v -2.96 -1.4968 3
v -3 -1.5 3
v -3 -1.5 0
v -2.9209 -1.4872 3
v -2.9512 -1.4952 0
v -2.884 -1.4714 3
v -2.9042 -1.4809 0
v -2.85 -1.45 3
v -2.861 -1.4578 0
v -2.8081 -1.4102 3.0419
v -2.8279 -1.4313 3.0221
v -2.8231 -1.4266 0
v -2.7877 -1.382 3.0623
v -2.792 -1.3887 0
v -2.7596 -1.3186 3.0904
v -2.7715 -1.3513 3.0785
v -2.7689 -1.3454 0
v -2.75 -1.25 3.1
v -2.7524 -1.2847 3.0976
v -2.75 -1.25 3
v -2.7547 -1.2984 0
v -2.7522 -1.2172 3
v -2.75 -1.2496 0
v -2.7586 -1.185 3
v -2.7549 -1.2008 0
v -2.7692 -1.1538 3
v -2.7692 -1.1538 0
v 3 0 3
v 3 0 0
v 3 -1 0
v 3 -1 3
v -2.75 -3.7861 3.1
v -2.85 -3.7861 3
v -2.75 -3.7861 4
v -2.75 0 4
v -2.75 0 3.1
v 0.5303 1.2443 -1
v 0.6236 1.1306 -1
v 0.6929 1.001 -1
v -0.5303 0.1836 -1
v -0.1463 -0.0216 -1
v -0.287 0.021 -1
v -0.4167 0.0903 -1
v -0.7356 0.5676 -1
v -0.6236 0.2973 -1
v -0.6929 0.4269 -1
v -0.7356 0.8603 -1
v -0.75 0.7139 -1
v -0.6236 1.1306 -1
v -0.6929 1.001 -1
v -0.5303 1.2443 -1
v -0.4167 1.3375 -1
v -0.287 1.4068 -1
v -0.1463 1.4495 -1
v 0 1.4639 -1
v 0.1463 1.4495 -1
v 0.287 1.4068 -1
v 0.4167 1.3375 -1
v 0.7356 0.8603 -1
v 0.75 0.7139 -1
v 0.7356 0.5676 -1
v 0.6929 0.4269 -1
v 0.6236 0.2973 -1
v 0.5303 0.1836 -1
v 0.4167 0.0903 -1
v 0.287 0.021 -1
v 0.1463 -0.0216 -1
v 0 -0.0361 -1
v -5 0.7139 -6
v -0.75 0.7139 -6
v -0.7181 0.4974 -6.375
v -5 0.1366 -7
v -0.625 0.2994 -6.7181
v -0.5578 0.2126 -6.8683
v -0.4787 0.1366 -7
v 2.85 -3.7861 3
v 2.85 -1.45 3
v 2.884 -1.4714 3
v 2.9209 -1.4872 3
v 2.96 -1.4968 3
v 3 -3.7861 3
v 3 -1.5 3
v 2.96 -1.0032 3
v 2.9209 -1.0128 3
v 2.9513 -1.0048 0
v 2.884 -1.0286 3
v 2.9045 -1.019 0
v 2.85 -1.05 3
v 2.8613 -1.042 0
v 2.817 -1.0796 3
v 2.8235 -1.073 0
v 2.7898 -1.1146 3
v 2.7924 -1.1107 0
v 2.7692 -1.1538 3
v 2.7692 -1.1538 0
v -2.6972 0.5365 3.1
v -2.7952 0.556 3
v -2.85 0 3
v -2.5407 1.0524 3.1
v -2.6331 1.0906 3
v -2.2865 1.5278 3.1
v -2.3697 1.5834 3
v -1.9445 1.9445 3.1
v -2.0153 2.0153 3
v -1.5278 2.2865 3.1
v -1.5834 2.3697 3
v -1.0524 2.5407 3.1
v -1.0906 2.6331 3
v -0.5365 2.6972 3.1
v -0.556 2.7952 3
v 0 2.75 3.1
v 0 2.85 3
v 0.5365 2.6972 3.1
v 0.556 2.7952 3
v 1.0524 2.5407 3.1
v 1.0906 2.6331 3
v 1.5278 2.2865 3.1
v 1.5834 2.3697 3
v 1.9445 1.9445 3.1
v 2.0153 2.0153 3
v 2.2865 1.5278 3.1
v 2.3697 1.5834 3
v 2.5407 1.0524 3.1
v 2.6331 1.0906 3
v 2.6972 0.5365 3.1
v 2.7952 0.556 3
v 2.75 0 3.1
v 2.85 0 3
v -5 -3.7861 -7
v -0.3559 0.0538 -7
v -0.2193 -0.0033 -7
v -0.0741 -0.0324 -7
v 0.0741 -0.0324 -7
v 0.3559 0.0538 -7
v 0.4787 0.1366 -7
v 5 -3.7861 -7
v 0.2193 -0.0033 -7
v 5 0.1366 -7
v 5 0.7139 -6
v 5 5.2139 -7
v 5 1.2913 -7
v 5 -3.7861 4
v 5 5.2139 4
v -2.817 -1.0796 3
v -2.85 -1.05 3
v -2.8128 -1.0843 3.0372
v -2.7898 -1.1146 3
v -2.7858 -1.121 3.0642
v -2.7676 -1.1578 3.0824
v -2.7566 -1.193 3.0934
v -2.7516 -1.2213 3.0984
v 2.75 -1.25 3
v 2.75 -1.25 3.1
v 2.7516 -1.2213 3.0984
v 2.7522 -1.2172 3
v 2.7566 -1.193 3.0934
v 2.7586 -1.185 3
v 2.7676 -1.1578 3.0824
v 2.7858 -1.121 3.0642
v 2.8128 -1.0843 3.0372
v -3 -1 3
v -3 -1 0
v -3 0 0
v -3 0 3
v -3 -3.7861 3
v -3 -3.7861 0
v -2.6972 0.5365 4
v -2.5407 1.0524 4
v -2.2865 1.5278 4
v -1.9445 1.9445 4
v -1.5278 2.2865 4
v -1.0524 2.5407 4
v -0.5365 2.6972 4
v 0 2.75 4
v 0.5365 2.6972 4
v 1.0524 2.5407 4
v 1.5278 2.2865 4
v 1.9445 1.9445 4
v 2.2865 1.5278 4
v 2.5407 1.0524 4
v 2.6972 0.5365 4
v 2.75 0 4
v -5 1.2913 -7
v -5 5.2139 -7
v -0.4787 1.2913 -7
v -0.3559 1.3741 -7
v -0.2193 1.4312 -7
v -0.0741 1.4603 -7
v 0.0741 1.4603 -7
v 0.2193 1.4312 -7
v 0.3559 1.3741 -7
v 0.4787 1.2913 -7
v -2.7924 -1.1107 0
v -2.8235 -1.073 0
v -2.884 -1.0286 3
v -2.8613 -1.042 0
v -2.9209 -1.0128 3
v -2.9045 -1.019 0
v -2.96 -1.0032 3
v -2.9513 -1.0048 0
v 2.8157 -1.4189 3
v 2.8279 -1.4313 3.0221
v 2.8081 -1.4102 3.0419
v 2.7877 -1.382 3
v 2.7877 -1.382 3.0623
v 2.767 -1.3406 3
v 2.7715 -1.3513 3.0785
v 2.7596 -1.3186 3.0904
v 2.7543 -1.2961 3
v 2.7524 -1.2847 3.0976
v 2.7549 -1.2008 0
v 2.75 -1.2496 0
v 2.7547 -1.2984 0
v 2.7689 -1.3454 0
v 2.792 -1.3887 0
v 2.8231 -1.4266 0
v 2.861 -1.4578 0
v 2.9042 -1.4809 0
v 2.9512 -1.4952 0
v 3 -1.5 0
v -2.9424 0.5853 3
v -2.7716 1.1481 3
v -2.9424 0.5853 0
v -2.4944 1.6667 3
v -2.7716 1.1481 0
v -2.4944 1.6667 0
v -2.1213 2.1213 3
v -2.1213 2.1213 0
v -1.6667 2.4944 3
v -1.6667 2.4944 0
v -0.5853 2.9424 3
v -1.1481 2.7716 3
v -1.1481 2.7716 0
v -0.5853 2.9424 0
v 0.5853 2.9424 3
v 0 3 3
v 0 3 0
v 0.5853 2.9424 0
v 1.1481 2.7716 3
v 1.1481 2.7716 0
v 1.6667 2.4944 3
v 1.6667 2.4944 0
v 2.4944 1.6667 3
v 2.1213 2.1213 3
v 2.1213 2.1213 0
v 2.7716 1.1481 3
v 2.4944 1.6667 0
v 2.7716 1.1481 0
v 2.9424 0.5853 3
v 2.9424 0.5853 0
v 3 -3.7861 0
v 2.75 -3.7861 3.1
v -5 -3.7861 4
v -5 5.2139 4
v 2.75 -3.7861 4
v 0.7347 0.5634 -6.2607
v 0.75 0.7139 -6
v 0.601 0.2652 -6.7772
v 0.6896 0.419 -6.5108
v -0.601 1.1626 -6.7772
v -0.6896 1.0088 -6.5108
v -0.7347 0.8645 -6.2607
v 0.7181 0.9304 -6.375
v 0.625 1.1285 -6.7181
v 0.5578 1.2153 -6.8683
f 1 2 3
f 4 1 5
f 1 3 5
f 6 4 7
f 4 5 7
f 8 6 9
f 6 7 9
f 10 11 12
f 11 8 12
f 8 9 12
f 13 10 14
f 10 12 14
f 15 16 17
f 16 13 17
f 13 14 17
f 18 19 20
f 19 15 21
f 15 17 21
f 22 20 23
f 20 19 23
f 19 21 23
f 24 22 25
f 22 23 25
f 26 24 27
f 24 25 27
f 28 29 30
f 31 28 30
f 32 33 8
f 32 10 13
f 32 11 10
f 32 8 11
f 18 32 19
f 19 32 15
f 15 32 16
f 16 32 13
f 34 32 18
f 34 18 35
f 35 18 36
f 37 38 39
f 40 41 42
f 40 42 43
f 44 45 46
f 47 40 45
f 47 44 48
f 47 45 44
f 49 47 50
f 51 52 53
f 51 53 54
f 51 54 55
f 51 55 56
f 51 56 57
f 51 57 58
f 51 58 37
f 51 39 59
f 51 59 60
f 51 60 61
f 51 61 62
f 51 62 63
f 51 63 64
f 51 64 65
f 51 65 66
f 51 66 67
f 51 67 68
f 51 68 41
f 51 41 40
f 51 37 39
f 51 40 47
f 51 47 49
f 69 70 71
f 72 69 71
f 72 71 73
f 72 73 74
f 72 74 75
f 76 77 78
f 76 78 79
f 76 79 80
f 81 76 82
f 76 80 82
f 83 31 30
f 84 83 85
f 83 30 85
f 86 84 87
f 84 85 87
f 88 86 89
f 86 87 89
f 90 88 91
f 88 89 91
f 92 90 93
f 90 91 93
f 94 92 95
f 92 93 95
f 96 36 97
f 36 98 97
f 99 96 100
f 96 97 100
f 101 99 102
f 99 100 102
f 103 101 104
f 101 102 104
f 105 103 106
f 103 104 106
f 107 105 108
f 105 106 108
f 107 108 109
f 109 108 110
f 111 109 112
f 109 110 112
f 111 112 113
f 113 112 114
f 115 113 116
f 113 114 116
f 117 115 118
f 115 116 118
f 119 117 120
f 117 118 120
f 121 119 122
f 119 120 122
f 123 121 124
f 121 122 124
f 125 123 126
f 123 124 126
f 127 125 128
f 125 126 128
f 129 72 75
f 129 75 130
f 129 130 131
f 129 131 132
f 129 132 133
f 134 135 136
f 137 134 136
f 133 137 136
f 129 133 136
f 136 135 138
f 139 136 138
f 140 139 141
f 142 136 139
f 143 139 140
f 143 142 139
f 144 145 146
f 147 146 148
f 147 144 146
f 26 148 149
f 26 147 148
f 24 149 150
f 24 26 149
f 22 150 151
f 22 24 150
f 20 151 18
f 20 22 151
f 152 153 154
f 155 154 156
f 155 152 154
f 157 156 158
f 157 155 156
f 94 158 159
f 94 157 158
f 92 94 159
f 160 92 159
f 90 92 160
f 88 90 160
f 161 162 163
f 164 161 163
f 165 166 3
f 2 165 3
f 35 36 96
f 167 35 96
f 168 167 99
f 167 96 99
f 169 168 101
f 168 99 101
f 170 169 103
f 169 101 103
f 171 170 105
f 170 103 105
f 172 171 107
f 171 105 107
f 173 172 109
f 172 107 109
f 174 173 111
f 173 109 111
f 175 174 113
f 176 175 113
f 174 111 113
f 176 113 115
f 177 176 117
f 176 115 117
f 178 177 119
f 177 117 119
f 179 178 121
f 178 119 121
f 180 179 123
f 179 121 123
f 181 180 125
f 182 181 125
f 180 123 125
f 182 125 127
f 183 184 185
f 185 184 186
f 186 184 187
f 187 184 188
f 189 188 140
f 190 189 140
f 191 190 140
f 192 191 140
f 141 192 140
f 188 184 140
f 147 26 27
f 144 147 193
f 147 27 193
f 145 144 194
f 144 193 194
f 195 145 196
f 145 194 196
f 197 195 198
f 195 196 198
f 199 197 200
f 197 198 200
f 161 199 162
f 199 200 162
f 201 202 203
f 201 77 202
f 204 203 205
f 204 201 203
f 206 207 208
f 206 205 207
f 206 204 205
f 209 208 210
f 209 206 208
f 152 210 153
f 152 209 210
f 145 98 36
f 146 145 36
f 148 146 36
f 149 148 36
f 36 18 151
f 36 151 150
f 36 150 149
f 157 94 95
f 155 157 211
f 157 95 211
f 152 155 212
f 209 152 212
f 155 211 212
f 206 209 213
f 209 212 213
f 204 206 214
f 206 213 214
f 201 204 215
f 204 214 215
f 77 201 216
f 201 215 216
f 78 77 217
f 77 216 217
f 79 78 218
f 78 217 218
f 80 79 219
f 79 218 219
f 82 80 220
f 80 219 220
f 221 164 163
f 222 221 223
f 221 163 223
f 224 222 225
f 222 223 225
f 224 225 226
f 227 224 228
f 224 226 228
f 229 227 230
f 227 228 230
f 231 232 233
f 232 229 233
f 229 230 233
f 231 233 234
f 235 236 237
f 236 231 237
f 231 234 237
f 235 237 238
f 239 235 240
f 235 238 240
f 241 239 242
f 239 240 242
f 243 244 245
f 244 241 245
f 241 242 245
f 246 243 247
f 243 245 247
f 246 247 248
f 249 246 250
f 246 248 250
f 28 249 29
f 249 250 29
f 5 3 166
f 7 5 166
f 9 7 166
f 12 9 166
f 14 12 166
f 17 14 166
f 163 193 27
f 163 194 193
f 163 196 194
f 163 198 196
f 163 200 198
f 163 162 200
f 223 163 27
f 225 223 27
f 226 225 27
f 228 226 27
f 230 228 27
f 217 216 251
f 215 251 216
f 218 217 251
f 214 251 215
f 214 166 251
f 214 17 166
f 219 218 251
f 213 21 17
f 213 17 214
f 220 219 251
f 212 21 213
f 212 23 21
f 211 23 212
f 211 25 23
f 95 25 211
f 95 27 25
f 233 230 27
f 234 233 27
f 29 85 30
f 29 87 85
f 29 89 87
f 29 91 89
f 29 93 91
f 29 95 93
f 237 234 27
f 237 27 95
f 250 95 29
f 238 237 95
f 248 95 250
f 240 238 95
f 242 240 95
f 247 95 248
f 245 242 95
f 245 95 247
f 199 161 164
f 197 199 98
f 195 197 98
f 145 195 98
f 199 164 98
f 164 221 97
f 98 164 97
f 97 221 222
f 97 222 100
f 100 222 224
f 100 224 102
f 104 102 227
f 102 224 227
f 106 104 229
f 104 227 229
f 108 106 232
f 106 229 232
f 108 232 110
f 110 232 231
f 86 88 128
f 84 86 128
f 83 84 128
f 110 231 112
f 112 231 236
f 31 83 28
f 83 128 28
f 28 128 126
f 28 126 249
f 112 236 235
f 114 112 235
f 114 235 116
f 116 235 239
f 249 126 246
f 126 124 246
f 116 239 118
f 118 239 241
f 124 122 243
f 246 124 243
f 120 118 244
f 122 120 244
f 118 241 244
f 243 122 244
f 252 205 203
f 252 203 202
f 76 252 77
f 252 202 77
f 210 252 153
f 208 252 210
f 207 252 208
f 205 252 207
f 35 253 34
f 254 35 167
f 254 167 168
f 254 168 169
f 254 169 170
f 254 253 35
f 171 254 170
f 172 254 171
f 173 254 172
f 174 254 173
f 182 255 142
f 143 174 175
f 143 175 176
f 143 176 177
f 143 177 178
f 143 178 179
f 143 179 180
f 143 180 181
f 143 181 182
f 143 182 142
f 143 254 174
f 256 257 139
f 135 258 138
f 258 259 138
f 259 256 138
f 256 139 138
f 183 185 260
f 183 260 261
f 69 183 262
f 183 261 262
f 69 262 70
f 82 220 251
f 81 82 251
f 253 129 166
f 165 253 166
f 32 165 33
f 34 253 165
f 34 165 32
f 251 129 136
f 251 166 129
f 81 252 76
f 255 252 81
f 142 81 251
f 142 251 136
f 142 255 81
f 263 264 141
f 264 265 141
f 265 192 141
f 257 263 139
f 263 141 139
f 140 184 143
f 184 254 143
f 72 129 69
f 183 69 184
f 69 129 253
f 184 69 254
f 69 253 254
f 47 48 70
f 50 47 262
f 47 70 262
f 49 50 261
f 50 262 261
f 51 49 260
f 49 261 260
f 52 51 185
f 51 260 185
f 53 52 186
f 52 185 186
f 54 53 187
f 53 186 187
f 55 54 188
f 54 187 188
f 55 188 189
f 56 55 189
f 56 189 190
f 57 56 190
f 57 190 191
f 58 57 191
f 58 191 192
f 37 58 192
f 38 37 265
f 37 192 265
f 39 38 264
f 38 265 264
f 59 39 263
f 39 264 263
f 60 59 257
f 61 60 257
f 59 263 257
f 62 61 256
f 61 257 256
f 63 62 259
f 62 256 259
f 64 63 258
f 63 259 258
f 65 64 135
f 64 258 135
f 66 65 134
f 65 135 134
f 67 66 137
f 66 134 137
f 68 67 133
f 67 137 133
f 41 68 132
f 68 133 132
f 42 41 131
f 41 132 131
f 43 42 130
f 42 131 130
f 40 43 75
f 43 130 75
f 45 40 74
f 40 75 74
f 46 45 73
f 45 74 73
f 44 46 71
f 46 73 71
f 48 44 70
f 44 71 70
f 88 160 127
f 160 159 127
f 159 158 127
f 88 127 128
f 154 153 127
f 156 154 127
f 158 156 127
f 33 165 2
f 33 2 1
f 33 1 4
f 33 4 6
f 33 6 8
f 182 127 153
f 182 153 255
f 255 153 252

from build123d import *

# Parameters (mm, degrees)
BOSS_EXTRUDE1_DEPTH = 4
SKETCH2_W           = 10
SKETCH2_H           = 9
BOSS_EXTRUDE2_DEPTH = 7
SKETCH3_R           = 0.75
CUT_EXTRUDE1_DEPTH  = 6
CUT_EXTRUDE3_REACH  = 15.273
BOSS_EXTRUDE3_START = -1
BOSS_EXTRUDE3_DEPTH = 1
CHAMFER1_SIZE       = 0.1


with BuildPart() as part:
    # Sketch1 → Boss-Extrude1 (new body)
    with BuildSketch(Plane.XY):
        with BuildLine():
            Line((-3, -3.786060838), (-3, -1.49999581))
            ThreePointArc((-3, -1.49999581), (-2.791987509, -1.388670983), (-2.769230655, -1.153842239))
            ThreePointArc((-2.769230655, -1.153842239), (-2.861324827, -1.041983319), (-3, -0.99999581))
            Line((-3, -0.99999581), (-3, 0))
            ThreePointArc((-3, 0), (0, 3), (3, 0))
            Line((3, 0), (3, -0.99999581))
            ThreePointArc((3, -0.99999581), (2.861324827, -1.041983319), (2.769230655, -1.153842239))
            ThreePointArc((2.769230655, -1.153842239), (2.791987509, -1.388670983), (3, -1.49999581))
            Line((3, -1.49999581), (3, -3.786060838))
            Line((3, -3.786060838), (5, -3.786060838))
            Line((5, -3.786060838), (5, 5.213939162))
            Line((5, 5.213939162), (-5, 5.213939162))
            Line((-5, 5.213939162), (-5, -3.786060838))
            Line((-5, -3.786060838), (-3, -3.786060838))
        make_face()
    extrude(amount=BOSS_EXTRUDE1_DEPTH)

    # Sketch2 → Boss-Extrude2 (add)
    with BuildSketch(Plane.XY):
        with Locations((0, 0.713939162)):
            Rectangle(SKETCH2_W, SKETCH2_H)
    extrude(amount=-BOSS_EXTRUDE2_DEPTH)

    # Sketch3 → Cut-Extrude1 (cut)
    with BuildSketch(Plane(origin=(0, 0, -7), x_dir=(-1, 0, 0), z_dir=(0, 0, -1))):
        with Locations((0, 0.713939162)):
            Circle(SKETCH3_R)
    extrude(amount=-CUT_EXTRUDE1_DEPTH, mode=Mode.SUBTRACT)

    # Cut-Extrude3: up to this face of the body (flat: up to its plane)
    cut_extrude3_end = Plane(part.part.faces().sort_by_distance((-5, 0.713939162, -1.5))[0])
    # Sketch4 → Cut-Extrude3 (cut, up to the picked face)
    with BuildSketch(Plane(origin=(5, 0, 0), x_dir=(0, 0, -1), z_dir=(1, 0, 0)), mode=Mode.PRIVATE) as cut_extrude3_sk1:
        Polygon((7.5, -0.152086242), (7.5, 1.579964565), (6, 0.713939162), align=None)
    cut_extrude3_tool1 = split(extrude(cut_extrude3_sk1.sketch, amount=-CUT_EXTRUDE3_REACH, mode=Mode.PRIVATE), bisect_by=cut_extrude3_end, keep=Keep.BOTH, mode=Mode.PRIVATE)
    add(cut_extrude3_tool1.solids().sort_by(Axis((5, 0.713939, -7), (-1, 0, 0)))[0], mode=Mode.SUBTRACT)

    # Sketch5 → Boss-Extrude3 (add)
    with BuildSketch(Plane.XY.offset(4).offset(BOSS_EXTRUDE3_START)):
        with BuildLine():
            ThreePointArc((3, 0), (0, 3), (-3, 0))
            Line((-3, 0), (-3, -3.786060838))
            Line((-3, -3.786060838), (-2.75, -3.786060838))
            Line((-2.75, -3.786060838), (-2.75, 0))
            ThreePointArc((-2.75, 0), (0, 2.75), (2.75, 0))
            Line((2.75, 0), (2.75, -3.786060838))
            Line((2.75, -3.786060838), (3, -3.786060838))
            Line((3, -3.786060838), (3, 0))
        make_face()
    extrude(amount=BOSS_EXTRUDE3_DEPTH)

    # Chamfer1
    # the kernel refuses this chamfer: 0.1 mm, written as the material it takes off along each edge
    with BuildSketch(Plane(origin=(2.75, -1.24999581, 3), x_dir=(-0.027495876610587302, 0, 0.9996219169112966), z_dir=(0, -1, 0))) as chamfer1_piece_1_section:
        Polygon((CHAMFER1_SIZE * 0.999621916911, -CHAMFER1_SIZE * 0.0274958766106), (-CHAMFER1_SIZE * 0.0274958766106, -CHAMFER1_SIZE * 0.999621916911), (0, 0), align=None)
    chamfer1_piece_1 = extrude(amount=2.793233327, mode=Mode.PRIVATE)
    chamfer1_piece_1 = chamfer1_piece_1 - Plane(origin=(3, -1.24999581, 3.033543391), x_dir=(0, 1, 0), z_dir=(0, 0, -1)) * Cylinder(0.25, 6, mode=Mode.PRIVATE)
    add(chamfer1_piece_1, mode=Mode.SUBTRACT)
    with BuildSketch(Plane(origin=(-2.75, -4.043229137, 3), x_dir=(-0.9996219169112966, 0, -0.027495876610587302), z_dir=(0, 1, 0))) as chamfer1_piece_2_section:
        Polygon((CHAMFER1_SIZE * 0.999621916911, CHAMFER1_SIZE * 0.0274958766106), (-CHAMFER1_SIZE * 0.0274958766106, CHAMFER1_SIZE * 0.999621916911), (0, 0), align=None)
    chamfer1_piece_2 = extrude(amount=2.793233327, mode=Mode.PRIVATE)
    chamfer1_piece_2 = chamfer1_piece_2 - Plane(origin=(-3, -1.24999581, 3.033543414), x_dir=(0, -1, 0), z_dir=(0, 0, -1)) * Cylinder(0.25, 6, mode=Mode.PRIVATE)
    add(chamfer1_piece_2, mode=Mode.SUBTRACT)
    with BuildSketch(Plane(origin=(2.75, 0, 3), x_dir=(-0.027495876610587302, 0, 0.9996219169112966), z_dir=(0, -1, 0))) as chamfer1_piece_3_section:
        Polygon((CHAMFER1_SIZE * 0.999621916911, -CHAMFER1_SIZE * 0.0274958766106), (-CHAMFER1_SIZE * 0.0274958766106, -CHAMFER1_SIZE * 0.999621916911), (0, 0), align=None)
    chamfer1_piece_3 = extrude(amount=1.24999581, mode=Mode.PRIVATE)
    chamfer1_piece_3 = chamfer1_piece_3 - Plane(origin=(3, -1.24999581, 3.033781207), x_dir=(0, 1, 0), z_dir=(0, 0, -1)) * Cylinder(0.25, 3, mode=Mode.PRIVATE)
    add(chamfer1_piece_3, mode=Mode.SUBTRACT)
    with BuildSketch(Plane(origin=(0, 0, 3), x_dir=(-1, 0, 0), z_dir=(0, -1, 0))) as chamfer1_piece_4:
        Polygon((2.75, -CHAMFER1_SIZE), (2.75 + CHAMFER1_SIZE, 0), (2.75, 0), align=None)
    revolve(axis=Axis((0, 0, 3), (0, 0, -1)), revolution_arc=180, mode=Mode.SUBTRACT)
    with BuildSketch(Plane(origin=(-2.75, -1.24999581, 3), x_dir=(-0.9996219169112966, 0, -0.027495876610587302), z_dir=(0, 1, 0))) as chamfer1_piece_5_section:
        Polygon((CHAMFER1_SIZE * 0.999621916911, CHAMFER1_SIZE * 0.0274958766106), (-CHAMFER1_SIZE * 0.0274958766106, CHAMFER1_SIZE * 0.999621916911), (0, 0), align=None)
    chamfer1_piece_5 = extrude(amount=1.24999581, mode=Mode.PRIVATE)
    chamfer1_piece_5 = chamfer1_piece_5 - Plane(origin=(-3, -1.24999581, 3.033781195), x_dir=(0, -1, 0), z_dir=(0, 0, -1)) * Cylinder(0.25, 3, mode=Mode.PRIVATE)
    add(chamfer1_piece_5, mode=Mode.SUBTRACT)


solid = part.part
